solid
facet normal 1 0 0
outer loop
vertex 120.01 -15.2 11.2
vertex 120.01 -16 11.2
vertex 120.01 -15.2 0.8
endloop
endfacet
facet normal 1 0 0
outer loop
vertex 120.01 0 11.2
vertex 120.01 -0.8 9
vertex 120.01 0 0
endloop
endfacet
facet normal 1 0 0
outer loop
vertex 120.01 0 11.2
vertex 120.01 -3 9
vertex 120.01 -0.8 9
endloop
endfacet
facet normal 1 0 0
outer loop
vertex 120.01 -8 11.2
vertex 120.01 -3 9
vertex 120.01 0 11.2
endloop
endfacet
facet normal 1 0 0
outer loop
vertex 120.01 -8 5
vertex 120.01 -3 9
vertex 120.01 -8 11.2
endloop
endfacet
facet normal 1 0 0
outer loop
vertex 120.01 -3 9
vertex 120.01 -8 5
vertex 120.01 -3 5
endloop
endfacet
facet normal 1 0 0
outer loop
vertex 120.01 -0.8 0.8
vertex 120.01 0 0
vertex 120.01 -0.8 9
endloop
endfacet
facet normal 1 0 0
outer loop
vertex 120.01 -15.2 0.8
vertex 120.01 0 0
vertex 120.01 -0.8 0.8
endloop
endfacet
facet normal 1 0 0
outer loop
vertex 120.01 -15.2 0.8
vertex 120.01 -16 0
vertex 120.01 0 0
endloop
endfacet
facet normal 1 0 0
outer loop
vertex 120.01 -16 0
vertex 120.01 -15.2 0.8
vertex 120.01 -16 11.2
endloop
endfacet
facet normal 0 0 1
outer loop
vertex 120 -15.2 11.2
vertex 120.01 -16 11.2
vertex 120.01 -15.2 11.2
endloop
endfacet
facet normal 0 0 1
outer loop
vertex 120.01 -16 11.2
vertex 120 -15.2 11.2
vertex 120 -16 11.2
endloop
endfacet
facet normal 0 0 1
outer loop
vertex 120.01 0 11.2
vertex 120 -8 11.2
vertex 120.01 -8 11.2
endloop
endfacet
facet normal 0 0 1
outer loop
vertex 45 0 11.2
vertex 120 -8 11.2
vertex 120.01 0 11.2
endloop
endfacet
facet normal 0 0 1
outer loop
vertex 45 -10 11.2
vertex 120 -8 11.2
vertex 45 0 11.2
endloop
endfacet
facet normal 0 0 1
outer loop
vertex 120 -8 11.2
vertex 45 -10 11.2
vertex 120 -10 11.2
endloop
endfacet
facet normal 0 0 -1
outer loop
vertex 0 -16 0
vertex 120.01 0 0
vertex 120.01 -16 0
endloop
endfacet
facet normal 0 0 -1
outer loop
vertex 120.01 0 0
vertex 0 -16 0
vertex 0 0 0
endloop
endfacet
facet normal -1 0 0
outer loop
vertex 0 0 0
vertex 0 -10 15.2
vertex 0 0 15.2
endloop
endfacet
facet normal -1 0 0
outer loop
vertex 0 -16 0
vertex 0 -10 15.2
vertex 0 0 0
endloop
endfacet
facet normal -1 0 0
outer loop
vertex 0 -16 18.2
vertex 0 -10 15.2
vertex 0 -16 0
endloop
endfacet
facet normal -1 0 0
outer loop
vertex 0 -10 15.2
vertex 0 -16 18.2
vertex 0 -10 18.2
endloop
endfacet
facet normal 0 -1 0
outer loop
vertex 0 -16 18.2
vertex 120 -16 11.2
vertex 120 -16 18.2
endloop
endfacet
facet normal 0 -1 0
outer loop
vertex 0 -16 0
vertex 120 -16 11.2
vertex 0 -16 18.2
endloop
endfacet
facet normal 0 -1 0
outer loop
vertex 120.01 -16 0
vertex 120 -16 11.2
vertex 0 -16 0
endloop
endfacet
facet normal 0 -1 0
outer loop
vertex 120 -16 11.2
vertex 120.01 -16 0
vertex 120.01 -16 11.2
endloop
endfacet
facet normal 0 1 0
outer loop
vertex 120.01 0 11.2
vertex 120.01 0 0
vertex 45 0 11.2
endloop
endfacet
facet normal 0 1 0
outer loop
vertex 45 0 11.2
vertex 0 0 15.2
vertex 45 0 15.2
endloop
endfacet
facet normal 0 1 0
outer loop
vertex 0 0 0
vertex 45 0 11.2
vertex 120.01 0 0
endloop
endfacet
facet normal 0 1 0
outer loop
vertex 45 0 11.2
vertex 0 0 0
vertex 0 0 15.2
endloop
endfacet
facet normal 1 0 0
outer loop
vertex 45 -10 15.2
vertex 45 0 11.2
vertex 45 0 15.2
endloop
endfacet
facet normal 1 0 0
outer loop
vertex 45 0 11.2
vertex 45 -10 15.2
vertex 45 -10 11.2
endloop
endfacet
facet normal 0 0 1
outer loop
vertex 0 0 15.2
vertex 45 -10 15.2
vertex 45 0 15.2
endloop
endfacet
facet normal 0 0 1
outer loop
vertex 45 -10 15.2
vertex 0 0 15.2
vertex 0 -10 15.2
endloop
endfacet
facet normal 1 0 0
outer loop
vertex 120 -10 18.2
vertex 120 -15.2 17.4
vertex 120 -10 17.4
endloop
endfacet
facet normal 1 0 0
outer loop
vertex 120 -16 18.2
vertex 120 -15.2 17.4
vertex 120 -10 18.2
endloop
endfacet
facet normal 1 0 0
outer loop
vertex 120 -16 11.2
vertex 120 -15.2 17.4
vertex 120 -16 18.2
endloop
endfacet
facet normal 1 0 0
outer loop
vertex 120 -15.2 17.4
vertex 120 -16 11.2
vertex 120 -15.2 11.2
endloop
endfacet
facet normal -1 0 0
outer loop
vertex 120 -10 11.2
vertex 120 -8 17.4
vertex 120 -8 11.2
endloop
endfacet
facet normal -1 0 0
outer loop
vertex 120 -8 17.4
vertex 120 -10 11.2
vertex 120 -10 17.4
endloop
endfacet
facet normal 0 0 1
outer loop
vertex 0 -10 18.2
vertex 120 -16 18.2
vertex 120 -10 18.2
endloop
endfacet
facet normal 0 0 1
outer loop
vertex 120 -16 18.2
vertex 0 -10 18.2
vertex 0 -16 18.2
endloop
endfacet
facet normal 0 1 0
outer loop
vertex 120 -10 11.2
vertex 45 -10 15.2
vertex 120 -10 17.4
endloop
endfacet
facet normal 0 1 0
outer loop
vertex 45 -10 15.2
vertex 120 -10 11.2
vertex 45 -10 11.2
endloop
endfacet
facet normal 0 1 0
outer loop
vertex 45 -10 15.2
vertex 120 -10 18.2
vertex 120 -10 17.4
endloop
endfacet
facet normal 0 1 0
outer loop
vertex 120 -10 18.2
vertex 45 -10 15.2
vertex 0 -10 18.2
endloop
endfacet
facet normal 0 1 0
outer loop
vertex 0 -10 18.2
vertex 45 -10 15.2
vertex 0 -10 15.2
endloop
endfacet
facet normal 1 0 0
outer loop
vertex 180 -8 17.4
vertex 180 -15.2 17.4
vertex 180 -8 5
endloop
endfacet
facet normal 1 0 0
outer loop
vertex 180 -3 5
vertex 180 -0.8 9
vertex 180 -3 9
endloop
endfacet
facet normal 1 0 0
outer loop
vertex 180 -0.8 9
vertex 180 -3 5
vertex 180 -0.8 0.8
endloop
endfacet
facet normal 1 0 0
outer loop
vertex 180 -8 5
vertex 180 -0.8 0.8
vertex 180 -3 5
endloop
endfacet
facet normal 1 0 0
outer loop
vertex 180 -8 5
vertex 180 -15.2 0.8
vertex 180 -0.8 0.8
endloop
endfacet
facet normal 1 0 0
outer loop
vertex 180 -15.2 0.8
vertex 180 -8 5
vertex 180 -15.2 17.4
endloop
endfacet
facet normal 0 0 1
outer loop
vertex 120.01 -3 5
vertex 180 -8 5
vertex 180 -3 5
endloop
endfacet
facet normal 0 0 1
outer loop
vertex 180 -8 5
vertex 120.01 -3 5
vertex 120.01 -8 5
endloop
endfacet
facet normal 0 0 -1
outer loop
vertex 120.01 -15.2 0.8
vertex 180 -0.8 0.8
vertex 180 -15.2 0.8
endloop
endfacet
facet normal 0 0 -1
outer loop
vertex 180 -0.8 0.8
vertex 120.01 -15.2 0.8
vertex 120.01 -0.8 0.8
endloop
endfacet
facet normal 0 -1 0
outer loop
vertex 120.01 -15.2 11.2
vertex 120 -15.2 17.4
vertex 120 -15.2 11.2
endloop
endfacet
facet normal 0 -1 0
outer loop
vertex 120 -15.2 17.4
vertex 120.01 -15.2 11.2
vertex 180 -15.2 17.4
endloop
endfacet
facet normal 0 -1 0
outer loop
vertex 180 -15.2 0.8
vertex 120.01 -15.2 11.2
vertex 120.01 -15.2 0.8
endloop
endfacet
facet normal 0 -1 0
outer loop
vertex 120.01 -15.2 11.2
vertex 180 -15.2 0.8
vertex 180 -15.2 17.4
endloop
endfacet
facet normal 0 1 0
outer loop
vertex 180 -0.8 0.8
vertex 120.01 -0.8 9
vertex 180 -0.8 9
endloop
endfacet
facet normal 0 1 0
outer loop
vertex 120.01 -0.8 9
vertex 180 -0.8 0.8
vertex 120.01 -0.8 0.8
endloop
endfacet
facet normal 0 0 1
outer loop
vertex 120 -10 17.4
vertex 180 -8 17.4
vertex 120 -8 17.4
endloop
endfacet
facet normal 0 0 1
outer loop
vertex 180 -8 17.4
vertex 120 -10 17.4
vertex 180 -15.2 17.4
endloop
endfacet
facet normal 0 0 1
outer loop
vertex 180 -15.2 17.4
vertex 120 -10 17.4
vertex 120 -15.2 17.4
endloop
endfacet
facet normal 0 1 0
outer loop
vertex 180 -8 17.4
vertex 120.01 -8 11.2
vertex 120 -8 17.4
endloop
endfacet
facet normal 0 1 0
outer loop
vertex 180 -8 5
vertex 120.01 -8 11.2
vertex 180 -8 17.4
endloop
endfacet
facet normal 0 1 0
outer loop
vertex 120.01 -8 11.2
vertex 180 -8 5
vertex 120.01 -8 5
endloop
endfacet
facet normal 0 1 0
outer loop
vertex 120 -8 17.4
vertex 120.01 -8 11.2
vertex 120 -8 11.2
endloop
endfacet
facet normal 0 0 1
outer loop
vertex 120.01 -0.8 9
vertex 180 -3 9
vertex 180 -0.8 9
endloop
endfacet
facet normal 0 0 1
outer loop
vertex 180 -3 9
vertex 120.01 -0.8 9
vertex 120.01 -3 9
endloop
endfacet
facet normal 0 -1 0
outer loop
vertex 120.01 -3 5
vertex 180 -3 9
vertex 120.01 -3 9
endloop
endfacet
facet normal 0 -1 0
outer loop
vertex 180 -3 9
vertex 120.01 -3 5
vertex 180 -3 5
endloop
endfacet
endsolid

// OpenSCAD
//
// Holder for a flat file in an inside opening
//

base_y_w = 16.0;
base_z_h = 18.2;
base_z_h_tip = 18.2 - 3.0;     // excludes the file tip of 2.7 mm
base_z_h_handle = 18.2 - 7.0;  // excludes the file handle of 6.28 mm

tape_th = 0.8;     // reserve for tape

rod_d = 5.0;  // actual diameter is 5.15 mm

module holder () {

    // We have 3 sections:
    //   1. Front where the flat part of the file goes
    //   2. Transition
    //   3. Rear where the handle and the rod attach

    // main base covers the front 2 sections
    cube([120.0 + 0.01, base_y_w, base_z_h_handle]);

    // front shelf for the flat of the file
    cube([45.0, base_y_w, base_z_h_tip]);
    // front ridge to push off
    translate([0, 10.0, 0])
        cube([120.0, base_y_w - 10.0, base_z_h]);

    // rear base
    translate([120.0, tape_th, tape_th])
        cube([60.0, base_y_w - tape_th*2, 5.0 - tape_th]);
    // rear ridge for push-off
    translate([120.0, base_y_w - 8.0, tape_th])
        cube([60.0, 8.0 - tape_th, base_z_h - tape_th*2]);
    // rod ridge
    translate([120.0, tape_th, tape_th])
        cube([60.0, base_y_w - 8.0 - rod_d - tape_th, 9.0 - tape_th]);
}

// holder();
mirror([0,1,0])
  holder();
